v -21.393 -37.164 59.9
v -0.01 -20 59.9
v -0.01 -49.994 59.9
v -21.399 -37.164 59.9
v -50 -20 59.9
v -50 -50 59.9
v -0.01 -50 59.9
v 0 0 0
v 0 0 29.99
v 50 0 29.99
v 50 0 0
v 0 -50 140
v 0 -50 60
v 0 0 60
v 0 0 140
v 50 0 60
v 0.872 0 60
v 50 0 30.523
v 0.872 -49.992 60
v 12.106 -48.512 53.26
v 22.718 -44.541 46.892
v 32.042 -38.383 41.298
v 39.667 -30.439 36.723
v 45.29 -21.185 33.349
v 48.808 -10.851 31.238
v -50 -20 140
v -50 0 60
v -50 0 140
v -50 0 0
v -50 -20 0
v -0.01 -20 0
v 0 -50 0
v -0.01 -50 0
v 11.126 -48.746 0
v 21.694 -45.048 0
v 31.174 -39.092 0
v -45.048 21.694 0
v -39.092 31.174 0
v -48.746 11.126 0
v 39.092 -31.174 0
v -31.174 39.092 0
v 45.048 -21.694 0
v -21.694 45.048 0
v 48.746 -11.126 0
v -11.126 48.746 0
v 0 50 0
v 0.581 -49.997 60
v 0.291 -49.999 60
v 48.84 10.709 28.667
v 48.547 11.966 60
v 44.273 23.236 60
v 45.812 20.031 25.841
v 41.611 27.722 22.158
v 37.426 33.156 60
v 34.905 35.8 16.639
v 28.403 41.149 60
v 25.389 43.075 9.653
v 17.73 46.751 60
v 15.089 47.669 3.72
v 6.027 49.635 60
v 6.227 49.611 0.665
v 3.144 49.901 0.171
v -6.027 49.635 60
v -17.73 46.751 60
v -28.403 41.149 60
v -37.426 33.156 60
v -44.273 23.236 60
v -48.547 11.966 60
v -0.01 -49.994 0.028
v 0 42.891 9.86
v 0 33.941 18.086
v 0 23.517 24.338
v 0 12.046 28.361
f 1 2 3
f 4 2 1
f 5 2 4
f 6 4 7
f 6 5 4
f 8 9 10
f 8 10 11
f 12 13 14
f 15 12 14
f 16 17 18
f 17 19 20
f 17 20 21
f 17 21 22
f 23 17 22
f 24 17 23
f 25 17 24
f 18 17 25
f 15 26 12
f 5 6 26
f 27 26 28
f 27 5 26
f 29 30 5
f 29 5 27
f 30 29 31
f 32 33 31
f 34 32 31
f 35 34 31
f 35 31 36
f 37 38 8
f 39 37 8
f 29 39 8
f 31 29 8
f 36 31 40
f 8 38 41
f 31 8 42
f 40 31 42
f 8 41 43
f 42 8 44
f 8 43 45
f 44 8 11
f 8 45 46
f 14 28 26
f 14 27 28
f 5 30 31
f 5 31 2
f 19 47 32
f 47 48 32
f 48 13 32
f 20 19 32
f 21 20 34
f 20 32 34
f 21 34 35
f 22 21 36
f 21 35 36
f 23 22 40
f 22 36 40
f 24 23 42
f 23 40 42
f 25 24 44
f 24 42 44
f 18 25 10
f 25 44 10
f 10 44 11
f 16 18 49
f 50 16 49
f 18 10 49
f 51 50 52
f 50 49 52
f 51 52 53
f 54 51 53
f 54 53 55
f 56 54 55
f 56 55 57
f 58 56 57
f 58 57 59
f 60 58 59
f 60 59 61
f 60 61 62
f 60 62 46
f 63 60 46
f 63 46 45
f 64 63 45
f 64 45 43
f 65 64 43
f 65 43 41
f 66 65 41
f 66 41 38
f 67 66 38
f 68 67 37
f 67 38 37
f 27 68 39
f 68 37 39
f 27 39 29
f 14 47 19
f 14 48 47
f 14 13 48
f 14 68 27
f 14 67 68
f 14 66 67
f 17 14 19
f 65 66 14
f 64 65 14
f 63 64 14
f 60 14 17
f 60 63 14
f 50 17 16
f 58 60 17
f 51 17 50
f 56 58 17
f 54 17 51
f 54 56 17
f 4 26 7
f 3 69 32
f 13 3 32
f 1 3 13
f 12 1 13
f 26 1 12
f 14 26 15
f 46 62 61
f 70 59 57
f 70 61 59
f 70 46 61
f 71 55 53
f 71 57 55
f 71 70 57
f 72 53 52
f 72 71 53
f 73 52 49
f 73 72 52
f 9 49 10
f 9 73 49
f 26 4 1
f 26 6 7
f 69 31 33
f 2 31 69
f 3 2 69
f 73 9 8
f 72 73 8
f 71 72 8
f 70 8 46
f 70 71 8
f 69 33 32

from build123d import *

# Parameters (mm, degrees)
F0_R      = 50
F1_DEPTH  = 60
F3_DEPTH  = 60.001
F4_W      = 50
F4_H      = 50
F5_DEPTH  = 140
F6_W      = 30
F6_H      = 59.9
F7_DEPTH  = 49.99
F13_DEPTH = 50.0010001
F15_DEPTH = 50.0010001


with BuildPart() as f1:
    # F0 (on Top) → F1 (new body)
    with BuildSketch(Plane.XY):
        Circle(F0_R)
    extrude(amount=F1_DEPTH)

    # F2 (on face) → F3 (cut, through all)
    with BuildSketch(Plane.XY.offset(60)):
        with BuildLine():
            Line((0, -50), (0, 0))
            Line((0, 0), (-50, 0))
            ThreePointArc((-50, 0), (-35.3553390593, -35.3553390593), (0, -50))
        make_face()
    extrude(amount=-F3_DEPTH, mode=Mode.SUBTRACT)

    # F4 (on Top) → F5 (join)
    with BuildSketch(Plane.XY):
        with Locations((-25, -25)):
            Rectangle(F4_W, F4_H)
    extrude(amount=F5_DEPTH)

    # F6 (on face) → F7 (cut)
    with BuildSketch(Plane(origin=(-50, 0, 0), x_dir=(0, -1, 0), z_dir=(-1, 0, 0))):
        with Locations((35, 29.95)):
            Rectangle(F6_W, F6_H)
    extrude(amount=-F7_DEPTH, mode=Mode.SUBTRACT)

    # F5_face2 (on face) → F9 section 0
    with BuildSketch(Plane(origin=(-24.9962622307, -50, 99.9395321524), x_dir=(1, 0, 0), z_dir=(0, -1, 0)), mode=Mode.PRIVATE) as f9_s0:
        Polygon((-25.0037377693, -40.0395321524), (24.9862622307, -40.0395321524), (24.9862622307, -99.9395321524), (24.9962622307, -99.9395321524), (24.9962622307, -39.9395321524), (24.9962622307, 40.0604678476), (-25.0037377693, 40.0604678476), align=None)
    loft([f9_s0.sketch, Vertex(-50, -20, 140)], mode=Mode.SUBTRACT)

    # F10 (on face) → F11 section 0
    with BuildSketch(Plane.XY.offset(140), mode=Mode.PRIVATE) as f11_s0:
        Polygon((-50, 0), (-50, -20), (0, 0), align=None)
    loft([f11_s0.sketch, Vertex(0, 0, 60)], mode=Mode.SUBTRACT)

    # F12 (on Front) → F13 (cut, through all)
    with BuildSketch(Plane.XZ):
        Polygon((50, 60.5232338582), (0, 60.5232338582), (50, 30.5232338582), align=None)
    extrude(amount=F13_DEPTH, mode=Mode.SUBTRACT)

    # F14 (on Right) → F15 (cut, through all)
    with BuildSketch(Plane.YZ):
        with BuildLine():
            Line((0, 29.99), (0, 0))
            Line((0, 0), (50, 0))
            ThreePointArc((50, 0), (28.8876713773, 21.4766128331), (0, 29.99))
        make_face()
    extrude(amount=F15_DEPTH, mode=Mode.SUBTRACT)


solid = f1.part
